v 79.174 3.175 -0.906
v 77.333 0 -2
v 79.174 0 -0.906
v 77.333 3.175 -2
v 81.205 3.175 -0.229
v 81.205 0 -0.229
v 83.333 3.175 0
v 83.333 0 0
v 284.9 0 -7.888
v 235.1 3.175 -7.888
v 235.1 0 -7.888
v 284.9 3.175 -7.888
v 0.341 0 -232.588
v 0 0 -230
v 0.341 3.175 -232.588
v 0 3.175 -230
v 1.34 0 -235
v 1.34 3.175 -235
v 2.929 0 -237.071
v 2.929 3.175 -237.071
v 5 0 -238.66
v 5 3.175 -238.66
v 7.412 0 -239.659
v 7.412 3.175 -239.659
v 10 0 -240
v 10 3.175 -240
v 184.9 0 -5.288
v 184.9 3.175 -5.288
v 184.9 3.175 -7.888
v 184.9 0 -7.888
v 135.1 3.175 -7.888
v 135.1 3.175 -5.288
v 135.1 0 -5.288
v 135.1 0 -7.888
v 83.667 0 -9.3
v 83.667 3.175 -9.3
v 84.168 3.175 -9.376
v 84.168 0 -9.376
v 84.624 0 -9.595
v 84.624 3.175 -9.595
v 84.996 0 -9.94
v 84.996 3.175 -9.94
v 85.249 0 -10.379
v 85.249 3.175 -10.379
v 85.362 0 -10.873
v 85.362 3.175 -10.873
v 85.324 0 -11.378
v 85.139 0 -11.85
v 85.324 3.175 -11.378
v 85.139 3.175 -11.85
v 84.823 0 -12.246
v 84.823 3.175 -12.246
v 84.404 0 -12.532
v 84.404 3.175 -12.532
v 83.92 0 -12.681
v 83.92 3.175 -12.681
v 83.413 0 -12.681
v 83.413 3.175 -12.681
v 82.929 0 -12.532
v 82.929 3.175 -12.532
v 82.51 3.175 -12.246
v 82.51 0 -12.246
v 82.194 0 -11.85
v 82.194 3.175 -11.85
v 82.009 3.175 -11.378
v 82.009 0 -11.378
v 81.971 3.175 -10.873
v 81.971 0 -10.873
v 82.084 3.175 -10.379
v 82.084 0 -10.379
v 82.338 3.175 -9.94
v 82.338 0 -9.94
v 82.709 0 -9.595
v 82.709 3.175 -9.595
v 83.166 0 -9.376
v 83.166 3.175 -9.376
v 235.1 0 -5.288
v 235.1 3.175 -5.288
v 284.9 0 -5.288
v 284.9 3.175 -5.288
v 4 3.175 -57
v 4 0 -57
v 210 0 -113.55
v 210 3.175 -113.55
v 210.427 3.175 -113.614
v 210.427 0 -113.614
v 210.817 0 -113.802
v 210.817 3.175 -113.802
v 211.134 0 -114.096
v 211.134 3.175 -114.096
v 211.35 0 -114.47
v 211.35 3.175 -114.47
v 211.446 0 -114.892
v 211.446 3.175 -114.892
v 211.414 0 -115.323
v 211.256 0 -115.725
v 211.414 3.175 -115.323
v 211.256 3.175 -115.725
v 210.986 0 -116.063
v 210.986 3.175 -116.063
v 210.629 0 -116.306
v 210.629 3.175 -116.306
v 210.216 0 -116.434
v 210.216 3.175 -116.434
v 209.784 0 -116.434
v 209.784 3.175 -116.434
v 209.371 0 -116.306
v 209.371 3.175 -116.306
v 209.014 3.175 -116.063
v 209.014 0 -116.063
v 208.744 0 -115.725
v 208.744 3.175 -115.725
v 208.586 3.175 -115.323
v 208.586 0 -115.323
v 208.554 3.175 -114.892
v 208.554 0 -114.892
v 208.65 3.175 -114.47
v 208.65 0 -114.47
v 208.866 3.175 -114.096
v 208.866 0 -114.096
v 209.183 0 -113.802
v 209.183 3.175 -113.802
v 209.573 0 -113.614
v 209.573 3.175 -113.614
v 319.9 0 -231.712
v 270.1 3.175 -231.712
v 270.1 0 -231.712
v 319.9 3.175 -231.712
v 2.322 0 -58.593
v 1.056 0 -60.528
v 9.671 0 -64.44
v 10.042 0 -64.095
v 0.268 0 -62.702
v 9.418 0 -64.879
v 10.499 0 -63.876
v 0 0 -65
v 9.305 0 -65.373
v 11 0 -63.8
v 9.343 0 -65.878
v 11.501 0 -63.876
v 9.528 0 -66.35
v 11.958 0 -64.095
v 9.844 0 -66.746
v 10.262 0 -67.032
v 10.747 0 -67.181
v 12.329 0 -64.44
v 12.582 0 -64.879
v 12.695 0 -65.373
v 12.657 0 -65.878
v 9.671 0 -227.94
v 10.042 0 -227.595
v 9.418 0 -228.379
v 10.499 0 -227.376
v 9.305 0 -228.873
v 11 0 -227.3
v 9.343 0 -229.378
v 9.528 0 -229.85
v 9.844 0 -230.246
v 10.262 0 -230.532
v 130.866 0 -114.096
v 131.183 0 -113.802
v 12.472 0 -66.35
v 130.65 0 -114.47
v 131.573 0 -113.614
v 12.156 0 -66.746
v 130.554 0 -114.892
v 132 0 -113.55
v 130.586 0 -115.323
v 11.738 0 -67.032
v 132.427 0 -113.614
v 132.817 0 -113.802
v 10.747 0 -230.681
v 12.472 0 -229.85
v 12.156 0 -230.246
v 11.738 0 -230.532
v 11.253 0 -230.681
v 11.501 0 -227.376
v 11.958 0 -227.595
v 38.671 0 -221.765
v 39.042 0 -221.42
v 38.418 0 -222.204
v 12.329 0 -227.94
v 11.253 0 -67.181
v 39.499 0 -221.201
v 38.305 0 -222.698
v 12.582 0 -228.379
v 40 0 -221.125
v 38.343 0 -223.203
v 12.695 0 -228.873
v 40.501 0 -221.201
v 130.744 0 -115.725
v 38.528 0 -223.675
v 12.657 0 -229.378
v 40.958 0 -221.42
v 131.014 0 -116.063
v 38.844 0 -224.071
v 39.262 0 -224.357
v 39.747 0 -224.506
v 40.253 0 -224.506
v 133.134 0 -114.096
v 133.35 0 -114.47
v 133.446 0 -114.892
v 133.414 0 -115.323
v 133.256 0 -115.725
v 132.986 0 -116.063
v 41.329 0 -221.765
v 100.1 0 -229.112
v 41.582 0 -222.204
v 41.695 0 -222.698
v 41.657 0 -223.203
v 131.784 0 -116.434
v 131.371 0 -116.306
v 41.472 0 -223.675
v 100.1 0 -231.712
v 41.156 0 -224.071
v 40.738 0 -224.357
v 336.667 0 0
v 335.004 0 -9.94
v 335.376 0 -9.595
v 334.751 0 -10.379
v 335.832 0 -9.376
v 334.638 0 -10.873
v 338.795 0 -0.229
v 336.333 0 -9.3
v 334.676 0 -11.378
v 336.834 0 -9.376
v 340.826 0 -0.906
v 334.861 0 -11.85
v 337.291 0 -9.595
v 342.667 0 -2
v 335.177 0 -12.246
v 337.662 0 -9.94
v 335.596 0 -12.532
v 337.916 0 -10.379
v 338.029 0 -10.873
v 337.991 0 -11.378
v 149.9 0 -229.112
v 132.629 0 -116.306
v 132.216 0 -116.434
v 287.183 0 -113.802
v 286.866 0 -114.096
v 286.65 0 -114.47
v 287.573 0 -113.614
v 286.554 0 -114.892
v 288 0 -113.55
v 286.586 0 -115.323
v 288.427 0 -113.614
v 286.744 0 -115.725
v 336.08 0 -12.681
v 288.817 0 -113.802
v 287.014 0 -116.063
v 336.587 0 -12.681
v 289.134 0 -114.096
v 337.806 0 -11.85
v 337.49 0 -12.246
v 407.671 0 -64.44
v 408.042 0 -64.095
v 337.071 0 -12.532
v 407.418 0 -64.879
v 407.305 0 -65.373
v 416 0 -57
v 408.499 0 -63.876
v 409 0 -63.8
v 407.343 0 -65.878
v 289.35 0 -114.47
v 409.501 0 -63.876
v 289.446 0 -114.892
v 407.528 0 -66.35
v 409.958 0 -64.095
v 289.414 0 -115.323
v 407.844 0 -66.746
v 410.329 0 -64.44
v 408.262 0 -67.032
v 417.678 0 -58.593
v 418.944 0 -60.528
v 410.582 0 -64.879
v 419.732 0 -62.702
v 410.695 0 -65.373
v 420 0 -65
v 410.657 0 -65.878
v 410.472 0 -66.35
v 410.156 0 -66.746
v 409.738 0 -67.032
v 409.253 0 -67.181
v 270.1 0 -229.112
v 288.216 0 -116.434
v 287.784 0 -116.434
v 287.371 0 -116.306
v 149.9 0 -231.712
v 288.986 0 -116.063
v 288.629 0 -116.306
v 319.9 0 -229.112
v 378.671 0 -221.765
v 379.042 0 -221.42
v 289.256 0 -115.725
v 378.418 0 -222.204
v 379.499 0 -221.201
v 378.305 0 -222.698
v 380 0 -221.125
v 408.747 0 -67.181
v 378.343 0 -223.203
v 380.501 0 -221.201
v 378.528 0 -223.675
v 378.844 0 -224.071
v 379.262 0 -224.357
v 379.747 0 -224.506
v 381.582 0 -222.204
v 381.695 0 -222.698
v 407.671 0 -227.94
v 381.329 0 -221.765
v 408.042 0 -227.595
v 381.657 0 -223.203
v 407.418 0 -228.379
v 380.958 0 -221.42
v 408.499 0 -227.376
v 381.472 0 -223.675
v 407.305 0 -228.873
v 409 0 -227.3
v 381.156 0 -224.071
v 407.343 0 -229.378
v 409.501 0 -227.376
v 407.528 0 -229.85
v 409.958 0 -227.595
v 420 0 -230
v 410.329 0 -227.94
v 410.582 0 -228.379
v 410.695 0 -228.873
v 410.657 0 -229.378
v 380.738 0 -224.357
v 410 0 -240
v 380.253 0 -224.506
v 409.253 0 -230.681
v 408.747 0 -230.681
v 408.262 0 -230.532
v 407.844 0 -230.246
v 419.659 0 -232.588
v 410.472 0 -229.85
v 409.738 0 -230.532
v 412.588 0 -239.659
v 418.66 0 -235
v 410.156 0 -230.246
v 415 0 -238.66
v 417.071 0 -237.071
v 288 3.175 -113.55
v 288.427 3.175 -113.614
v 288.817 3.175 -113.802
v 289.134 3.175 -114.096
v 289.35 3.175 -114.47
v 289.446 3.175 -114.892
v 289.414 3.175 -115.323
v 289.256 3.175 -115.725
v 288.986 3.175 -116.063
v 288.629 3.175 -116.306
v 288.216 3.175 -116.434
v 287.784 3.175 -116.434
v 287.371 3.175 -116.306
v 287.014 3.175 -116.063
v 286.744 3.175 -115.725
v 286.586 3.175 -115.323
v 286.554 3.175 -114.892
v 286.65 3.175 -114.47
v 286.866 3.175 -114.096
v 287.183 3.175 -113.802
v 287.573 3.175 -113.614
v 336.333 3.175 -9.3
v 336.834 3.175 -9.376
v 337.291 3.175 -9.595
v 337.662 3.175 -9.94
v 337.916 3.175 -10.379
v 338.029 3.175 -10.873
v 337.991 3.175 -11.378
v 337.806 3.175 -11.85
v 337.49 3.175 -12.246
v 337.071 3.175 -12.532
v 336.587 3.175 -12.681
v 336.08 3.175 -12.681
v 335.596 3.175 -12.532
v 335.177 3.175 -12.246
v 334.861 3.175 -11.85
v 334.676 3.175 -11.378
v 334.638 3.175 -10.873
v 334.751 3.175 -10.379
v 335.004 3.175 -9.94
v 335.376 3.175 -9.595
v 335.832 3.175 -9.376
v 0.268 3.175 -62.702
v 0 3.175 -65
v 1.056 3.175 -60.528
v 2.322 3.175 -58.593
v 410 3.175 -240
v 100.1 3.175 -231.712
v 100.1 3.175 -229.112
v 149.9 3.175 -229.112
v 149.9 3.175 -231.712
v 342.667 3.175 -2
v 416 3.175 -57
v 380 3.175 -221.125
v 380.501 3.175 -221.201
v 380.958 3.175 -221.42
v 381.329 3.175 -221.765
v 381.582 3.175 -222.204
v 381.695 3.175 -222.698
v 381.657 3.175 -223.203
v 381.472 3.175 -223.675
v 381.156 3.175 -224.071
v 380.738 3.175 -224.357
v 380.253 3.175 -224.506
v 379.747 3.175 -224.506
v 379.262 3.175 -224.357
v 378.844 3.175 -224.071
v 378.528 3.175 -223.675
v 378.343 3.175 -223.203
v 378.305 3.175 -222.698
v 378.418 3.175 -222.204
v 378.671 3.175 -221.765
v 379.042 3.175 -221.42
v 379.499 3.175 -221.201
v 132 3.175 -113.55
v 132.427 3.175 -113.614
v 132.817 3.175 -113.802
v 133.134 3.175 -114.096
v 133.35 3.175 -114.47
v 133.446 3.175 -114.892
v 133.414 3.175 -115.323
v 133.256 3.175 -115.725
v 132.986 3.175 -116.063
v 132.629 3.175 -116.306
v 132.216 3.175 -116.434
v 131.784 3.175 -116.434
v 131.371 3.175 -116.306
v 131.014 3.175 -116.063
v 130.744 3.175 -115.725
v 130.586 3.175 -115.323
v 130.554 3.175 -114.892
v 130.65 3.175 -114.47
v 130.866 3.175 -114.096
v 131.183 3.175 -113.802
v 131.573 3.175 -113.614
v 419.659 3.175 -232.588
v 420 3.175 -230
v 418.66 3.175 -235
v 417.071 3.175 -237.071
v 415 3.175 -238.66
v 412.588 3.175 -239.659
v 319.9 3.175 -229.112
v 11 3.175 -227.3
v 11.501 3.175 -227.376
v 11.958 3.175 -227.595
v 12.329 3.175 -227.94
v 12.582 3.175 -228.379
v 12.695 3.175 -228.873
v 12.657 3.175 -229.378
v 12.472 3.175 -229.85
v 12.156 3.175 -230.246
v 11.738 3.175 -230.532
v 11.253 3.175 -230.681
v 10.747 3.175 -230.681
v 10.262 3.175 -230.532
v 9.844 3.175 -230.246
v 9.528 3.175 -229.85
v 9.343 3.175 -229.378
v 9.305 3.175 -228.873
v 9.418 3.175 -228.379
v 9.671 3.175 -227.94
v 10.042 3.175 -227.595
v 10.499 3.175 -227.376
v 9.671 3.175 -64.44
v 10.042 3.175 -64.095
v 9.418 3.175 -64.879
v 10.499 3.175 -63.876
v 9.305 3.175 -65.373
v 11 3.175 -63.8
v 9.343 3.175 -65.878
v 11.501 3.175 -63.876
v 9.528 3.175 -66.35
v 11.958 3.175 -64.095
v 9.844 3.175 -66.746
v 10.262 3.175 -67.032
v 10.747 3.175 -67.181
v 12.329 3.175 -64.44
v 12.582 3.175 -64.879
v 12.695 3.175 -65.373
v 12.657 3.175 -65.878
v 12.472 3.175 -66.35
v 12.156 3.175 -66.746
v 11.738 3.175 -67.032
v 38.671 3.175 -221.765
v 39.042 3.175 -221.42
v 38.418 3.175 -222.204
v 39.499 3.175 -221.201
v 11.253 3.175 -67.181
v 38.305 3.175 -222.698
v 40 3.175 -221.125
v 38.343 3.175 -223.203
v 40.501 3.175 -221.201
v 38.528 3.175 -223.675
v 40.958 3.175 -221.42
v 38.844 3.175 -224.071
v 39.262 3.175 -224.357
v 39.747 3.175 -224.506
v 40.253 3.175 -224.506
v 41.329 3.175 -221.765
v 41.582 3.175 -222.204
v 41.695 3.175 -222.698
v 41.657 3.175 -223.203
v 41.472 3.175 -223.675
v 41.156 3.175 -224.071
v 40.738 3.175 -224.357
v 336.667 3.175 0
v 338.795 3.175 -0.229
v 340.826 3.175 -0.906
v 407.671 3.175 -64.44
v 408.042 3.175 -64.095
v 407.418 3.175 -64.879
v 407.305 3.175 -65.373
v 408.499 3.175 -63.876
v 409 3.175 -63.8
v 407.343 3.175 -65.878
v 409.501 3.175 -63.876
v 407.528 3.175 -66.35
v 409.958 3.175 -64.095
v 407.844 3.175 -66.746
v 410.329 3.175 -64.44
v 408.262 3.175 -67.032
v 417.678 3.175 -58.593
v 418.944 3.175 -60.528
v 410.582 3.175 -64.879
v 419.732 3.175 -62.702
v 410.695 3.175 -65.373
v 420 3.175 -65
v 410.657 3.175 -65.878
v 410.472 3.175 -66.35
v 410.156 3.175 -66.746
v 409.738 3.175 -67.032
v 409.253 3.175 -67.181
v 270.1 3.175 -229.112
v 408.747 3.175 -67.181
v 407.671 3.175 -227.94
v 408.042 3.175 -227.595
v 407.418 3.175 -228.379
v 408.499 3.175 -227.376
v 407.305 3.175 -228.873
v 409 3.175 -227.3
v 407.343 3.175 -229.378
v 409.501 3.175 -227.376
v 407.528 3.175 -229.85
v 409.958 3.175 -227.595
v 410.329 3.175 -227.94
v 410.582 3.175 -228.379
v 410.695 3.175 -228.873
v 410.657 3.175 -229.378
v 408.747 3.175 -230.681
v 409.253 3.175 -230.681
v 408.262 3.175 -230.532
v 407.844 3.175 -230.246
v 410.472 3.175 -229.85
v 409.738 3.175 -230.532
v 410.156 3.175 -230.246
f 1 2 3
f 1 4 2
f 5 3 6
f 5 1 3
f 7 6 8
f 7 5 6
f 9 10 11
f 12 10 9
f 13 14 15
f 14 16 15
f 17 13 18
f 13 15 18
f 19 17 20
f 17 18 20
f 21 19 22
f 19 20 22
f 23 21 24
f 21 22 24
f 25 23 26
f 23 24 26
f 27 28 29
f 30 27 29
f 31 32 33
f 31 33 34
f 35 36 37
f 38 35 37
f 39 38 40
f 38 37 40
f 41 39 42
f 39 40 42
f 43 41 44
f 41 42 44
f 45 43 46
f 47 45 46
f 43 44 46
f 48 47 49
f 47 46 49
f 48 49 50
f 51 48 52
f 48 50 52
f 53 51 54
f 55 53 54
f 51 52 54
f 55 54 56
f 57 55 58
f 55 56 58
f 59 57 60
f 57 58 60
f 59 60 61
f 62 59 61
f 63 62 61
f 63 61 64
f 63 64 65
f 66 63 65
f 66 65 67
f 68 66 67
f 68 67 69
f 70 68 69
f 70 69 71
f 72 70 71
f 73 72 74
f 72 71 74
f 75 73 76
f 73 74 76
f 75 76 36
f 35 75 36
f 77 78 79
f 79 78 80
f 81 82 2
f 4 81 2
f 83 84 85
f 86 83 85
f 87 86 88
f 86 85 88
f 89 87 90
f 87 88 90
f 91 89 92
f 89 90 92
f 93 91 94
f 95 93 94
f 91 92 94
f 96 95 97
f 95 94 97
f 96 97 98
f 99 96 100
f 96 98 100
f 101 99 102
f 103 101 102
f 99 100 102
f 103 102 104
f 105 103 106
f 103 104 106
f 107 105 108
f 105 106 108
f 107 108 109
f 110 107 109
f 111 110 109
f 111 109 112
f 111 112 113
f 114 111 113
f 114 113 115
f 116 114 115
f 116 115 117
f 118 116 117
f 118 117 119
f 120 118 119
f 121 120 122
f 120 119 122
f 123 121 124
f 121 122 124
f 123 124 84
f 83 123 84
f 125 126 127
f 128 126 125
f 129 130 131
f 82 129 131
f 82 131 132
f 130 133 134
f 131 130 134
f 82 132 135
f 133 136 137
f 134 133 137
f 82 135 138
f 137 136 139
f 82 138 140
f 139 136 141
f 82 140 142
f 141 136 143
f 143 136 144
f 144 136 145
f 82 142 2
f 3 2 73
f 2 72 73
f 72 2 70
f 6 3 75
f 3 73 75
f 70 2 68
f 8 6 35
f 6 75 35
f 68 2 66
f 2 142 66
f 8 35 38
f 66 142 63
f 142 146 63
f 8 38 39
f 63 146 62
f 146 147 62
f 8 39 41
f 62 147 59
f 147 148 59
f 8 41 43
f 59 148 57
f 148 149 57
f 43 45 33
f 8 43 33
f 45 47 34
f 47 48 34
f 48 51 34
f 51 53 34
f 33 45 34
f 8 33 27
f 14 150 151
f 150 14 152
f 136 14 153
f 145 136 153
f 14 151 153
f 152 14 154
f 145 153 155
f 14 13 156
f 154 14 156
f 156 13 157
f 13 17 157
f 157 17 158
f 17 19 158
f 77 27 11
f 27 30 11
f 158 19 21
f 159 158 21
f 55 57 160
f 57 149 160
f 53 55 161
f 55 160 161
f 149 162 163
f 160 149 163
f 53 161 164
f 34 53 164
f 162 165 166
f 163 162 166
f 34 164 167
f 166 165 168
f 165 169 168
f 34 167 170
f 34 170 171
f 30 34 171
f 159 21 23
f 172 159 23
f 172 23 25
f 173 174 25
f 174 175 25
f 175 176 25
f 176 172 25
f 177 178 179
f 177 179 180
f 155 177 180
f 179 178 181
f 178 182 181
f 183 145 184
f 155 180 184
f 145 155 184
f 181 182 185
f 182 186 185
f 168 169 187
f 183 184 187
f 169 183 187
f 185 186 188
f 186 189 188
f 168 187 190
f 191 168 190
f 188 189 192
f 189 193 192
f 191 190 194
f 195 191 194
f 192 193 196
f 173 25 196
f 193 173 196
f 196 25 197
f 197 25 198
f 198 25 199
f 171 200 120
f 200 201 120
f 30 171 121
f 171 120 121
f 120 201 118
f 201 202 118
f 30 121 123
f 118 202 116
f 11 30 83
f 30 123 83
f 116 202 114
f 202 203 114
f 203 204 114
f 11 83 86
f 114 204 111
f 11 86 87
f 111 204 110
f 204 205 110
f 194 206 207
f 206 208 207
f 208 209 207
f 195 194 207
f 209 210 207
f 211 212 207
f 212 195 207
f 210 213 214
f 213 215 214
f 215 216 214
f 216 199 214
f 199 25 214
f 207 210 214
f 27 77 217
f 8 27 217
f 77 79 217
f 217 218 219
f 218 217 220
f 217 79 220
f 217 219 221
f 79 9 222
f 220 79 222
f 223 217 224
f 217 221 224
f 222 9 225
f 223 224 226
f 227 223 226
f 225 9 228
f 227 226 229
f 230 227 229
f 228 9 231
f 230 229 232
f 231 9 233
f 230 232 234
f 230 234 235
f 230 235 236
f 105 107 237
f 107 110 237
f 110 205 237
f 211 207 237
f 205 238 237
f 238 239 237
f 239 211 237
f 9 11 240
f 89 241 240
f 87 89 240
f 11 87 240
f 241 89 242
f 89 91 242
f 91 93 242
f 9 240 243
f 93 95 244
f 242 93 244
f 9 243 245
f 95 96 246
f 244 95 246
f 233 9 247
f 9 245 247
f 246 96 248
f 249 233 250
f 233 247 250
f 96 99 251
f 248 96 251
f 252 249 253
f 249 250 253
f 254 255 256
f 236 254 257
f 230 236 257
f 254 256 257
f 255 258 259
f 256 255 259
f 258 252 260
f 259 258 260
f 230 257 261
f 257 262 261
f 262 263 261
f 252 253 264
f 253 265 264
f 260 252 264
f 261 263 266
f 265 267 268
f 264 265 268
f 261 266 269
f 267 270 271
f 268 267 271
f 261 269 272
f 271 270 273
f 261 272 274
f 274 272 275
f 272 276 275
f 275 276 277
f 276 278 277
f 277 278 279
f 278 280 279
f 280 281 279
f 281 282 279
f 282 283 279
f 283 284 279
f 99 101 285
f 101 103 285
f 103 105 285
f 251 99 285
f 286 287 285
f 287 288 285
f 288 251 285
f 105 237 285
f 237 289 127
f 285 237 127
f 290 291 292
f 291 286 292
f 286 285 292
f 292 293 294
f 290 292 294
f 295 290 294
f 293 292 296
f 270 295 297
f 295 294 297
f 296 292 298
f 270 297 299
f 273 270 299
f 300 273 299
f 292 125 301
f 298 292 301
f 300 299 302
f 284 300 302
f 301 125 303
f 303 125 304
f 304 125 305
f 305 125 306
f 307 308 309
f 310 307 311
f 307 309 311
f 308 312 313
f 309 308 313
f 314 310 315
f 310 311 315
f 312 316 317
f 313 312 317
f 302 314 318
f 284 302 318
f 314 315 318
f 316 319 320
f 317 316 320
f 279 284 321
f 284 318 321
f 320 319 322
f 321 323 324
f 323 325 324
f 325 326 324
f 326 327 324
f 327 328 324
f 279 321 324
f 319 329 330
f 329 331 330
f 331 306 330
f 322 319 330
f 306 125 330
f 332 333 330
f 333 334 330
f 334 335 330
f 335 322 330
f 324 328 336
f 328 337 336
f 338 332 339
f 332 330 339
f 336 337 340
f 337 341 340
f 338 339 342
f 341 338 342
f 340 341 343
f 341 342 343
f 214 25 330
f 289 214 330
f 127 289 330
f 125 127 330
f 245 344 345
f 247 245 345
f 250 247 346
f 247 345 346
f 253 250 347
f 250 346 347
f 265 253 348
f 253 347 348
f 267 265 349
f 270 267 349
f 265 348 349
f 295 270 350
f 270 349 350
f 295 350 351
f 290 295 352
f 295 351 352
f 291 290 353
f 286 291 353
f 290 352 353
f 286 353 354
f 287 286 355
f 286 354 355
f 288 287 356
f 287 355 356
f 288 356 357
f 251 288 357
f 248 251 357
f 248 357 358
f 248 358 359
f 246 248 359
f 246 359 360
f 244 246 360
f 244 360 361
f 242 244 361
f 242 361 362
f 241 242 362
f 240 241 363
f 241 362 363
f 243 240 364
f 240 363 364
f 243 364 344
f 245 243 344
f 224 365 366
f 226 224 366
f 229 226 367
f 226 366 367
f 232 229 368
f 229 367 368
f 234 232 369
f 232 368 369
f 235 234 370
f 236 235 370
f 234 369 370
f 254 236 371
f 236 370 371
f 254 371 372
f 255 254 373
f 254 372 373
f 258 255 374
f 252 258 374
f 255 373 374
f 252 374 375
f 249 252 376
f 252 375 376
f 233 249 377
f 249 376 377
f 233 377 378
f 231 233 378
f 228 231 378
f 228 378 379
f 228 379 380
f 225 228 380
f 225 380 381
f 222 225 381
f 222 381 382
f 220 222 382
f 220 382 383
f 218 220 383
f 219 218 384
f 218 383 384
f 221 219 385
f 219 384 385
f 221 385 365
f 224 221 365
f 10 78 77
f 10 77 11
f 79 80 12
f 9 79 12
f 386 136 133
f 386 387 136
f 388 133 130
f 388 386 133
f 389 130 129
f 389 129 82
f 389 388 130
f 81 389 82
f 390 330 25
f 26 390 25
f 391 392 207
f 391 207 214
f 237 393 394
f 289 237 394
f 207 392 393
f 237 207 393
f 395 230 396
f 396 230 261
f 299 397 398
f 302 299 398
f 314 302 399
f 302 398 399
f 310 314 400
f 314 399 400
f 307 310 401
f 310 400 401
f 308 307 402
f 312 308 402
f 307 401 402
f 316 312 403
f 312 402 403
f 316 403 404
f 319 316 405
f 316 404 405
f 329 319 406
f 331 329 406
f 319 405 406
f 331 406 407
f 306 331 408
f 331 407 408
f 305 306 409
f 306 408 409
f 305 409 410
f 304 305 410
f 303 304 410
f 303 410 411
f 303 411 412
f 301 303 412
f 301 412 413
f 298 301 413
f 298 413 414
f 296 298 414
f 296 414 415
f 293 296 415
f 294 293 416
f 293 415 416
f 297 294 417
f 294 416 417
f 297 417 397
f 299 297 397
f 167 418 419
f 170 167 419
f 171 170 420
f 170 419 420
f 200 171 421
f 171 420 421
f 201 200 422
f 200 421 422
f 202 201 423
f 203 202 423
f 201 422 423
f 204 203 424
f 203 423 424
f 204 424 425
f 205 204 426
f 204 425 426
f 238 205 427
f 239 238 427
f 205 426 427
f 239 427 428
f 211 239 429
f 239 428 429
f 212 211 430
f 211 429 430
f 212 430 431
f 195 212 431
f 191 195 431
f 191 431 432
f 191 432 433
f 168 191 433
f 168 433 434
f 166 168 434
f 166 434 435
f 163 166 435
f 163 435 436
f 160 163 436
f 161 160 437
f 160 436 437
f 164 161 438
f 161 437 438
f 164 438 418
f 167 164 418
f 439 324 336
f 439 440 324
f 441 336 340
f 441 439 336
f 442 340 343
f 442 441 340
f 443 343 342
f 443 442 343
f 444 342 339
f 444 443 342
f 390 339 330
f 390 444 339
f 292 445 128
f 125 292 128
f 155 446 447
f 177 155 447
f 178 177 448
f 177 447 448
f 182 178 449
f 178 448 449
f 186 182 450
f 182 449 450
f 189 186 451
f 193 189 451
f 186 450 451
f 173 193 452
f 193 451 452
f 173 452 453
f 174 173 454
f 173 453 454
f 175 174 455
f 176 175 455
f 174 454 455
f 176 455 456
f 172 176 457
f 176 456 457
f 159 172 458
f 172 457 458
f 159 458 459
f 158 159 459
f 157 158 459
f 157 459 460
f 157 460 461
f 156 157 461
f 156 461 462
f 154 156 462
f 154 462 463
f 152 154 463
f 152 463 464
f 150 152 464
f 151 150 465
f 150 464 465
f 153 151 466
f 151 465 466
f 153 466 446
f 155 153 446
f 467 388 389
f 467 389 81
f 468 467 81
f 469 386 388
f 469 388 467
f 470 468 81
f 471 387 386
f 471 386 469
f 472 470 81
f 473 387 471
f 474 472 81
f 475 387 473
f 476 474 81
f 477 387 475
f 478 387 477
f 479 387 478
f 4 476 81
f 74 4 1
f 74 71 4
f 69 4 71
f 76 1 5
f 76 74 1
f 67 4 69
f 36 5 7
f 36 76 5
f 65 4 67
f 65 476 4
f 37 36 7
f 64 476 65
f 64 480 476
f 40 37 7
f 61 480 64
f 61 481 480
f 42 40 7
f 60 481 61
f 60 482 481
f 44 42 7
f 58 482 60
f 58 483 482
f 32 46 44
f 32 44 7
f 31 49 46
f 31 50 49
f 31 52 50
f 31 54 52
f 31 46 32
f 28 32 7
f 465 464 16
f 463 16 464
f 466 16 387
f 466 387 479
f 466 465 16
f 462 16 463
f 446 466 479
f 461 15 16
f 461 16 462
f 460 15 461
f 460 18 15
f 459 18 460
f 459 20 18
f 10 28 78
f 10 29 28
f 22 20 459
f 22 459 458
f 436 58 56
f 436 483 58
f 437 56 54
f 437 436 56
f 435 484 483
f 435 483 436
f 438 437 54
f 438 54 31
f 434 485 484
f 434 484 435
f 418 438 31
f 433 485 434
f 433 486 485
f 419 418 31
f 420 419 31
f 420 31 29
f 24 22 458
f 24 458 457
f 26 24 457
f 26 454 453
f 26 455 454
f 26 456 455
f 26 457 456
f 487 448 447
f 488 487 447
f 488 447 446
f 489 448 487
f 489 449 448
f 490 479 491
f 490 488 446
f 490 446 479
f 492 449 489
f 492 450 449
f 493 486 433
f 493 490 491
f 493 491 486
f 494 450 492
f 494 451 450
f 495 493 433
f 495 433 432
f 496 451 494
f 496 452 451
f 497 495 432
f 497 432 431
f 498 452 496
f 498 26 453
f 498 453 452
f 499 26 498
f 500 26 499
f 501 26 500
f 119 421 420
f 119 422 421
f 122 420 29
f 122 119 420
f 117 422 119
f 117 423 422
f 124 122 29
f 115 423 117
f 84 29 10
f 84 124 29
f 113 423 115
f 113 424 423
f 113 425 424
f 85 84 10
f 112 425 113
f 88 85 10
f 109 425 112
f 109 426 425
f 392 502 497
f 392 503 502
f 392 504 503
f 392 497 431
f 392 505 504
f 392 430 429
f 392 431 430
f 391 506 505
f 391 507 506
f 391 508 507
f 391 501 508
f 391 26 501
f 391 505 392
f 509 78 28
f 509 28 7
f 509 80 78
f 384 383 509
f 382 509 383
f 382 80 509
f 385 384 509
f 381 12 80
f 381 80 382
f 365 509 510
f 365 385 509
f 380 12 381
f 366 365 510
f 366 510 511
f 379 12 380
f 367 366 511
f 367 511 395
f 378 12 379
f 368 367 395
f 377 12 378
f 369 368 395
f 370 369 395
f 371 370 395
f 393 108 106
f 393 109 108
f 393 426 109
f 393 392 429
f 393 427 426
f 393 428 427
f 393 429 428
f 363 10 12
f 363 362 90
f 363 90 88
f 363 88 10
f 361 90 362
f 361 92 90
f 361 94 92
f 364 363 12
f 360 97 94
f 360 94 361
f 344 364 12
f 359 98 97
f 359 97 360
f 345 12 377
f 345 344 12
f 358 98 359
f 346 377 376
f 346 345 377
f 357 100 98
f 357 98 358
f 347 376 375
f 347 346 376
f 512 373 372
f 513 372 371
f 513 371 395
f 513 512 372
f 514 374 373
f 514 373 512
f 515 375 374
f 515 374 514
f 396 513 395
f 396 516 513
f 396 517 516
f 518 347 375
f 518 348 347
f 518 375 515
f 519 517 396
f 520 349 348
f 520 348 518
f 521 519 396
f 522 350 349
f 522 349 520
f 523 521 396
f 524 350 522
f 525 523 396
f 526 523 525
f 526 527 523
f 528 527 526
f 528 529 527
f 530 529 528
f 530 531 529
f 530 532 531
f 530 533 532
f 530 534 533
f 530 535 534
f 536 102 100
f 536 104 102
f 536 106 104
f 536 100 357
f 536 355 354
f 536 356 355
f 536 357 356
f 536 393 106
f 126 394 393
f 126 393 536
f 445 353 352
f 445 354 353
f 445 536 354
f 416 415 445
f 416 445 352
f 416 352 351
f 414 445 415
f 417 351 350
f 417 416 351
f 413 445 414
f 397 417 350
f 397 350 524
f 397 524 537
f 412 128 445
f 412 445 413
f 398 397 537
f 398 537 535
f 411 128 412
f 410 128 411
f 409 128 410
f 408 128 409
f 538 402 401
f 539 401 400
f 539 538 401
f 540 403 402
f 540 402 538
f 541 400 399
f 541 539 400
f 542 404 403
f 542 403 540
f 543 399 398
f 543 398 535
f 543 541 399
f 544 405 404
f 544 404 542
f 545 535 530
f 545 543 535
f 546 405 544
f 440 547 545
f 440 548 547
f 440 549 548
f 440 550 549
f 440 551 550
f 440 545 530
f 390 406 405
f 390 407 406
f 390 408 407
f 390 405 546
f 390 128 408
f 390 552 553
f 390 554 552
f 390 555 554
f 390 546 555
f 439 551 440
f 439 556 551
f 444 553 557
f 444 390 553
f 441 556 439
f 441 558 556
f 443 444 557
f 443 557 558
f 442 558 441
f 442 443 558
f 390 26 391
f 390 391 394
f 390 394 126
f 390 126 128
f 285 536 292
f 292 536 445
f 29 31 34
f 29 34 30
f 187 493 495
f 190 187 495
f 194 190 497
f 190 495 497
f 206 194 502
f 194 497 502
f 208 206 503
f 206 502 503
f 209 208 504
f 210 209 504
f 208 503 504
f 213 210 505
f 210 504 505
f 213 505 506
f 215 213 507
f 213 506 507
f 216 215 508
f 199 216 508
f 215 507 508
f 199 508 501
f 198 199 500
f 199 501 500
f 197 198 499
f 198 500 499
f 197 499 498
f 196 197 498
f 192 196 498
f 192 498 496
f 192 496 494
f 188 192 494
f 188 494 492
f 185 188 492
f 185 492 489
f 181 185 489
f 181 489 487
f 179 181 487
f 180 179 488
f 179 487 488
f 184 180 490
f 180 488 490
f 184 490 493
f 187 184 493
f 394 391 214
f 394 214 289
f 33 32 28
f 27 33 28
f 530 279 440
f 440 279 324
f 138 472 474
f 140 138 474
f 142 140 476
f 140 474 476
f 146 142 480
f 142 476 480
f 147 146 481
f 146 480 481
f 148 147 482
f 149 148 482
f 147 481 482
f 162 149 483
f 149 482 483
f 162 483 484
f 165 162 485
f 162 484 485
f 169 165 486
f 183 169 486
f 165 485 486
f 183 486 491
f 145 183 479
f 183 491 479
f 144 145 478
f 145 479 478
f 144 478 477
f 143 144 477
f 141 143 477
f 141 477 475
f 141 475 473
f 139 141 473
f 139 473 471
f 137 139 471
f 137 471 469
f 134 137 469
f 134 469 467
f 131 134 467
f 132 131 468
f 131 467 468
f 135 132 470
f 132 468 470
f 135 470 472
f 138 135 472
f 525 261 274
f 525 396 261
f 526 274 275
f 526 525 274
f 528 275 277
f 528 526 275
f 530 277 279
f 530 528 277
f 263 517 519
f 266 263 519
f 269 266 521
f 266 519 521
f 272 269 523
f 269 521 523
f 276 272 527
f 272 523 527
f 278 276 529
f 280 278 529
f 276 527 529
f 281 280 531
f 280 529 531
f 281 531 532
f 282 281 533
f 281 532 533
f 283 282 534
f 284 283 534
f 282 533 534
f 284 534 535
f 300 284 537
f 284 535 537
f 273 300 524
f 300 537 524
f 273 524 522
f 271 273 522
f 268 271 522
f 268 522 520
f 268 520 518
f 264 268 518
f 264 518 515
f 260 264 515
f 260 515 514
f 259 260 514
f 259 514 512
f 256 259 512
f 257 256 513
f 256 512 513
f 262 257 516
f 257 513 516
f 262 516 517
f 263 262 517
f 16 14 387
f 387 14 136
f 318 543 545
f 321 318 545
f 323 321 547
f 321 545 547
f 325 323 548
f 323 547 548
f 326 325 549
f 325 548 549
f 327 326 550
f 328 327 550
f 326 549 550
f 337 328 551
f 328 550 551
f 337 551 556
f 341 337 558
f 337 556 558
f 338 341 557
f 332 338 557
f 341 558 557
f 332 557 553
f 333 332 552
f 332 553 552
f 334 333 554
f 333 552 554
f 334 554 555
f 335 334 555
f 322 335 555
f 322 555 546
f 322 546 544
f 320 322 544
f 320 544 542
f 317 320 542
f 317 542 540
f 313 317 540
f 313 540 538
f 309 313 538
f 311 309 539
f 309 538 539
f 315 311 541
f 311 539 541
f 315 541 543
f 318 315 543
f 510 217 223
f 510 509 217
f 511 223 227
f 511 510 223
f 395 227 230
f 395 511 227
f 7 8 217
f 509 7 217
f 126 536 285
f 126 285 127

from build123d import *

# Parameters (mm, degrees)
BOSS_EXTRUDE1_DEPTH = 3.175
FILLET1_R           = 10
SKETCH2_R           = 1.7
SKETCH2_R_2         = 1.45
CUT_EXTRUDE1_DEPTH  = 3.175
SKETCH6_W           = 49.8
SKETCH6_H           = 2.6
CUT_EXTRUDE2_DEPTH  = 3.175


with BuildPart() as part:
    # Sketch1 → Boss-Extrude1 (new body)
    with BuildSketch(Plane(origin=(0, 0, 0), x_dir=(1, 0, 0), z_dir=(0, 1, 0))):
        Polygon((0, 240), (0, 60), (80, 0), (340, 0), (420, 60), (420, 240), align=None)
    extrude(amount=BOSS_EXTRUDE1_DEPTH)

    # Fillet1
    fillet1_edges = [part.edges().sort_by_distance(p)[0] for p in [
        (420, 1.5875, -240),
        (420, 1.5875, -60),
        (340, 1.5875, 0),
        (80, 1.5875, 0),
        (0, 1.5875, -60),
        (0, 1.5875, -240),
    ]]
    fillet(fillet1_edges, radius=FILLET1_R)

    # Sketch2 → Cut-Extrude1 (cut)
    with BuildSketch(Plane(origin=(0, 3.175, 0), x_dir=(1, 0, 0), z_dir=(0, 1, 0))):
        with Locations(Location((11, 229, 0), (0, 0, 270))):
            Circle(SKETCH2_R)
        with Locations(Location((11, 65.5, 0), (0, 0, 270))):
            Circle(SKETCH2_R)
        with Locations(Location((83.666666667, 11, 0), (0, 0, 270))):
            Circle(SKETCH2_R)
        with Locations(Location((409, 65.5, 0), (0, 0, 270))):
            Circle(SKETCH2_R)
        with Locations(Location((336.333333333, 11, 0), (0, 0, 270))):
            Circle(SKETCH2_R)
        with Locations(Location((210, 115, 0), (0, 0, 270))):
            Circle(SKETCH2_R_2)
        with Locations(Location((132, 115, 0), (0, 0, 270))):
            Circle(SKETCH2_R_2)
        with Locations(Location((288, 115, 0), (0, 0, 270))):
            Circle(SKETCH2_R_2)
        with Locations(Location((40, 222.825, 0), (0, 0, 270))):
            Circle(SKETCH2_R)
        with Locations(Location((380, 222.825, 0), (0, 0, 270))):
            Circle(SKETCH2_R)
        with Locations(Location((409, 229, 0), (0, 0, 270))):
            Circle(SKETCH2_R)
    extrude(amount=-CUT_EXTRUDE1_DEPTH, mode=Mode.SUBTRACT)

    # Sketch6 → Cut-Extrude2 (cut)
    with BuildSketch(Plane(origin=(0, 3.175, 0), x_dir=(1, 0, 0), z_dir=(0, 1, 0))):
        with Locations((160, 6.5875)):
            Rectangle(SKETCH6_W, SKETCH6_H)
        with Locations((125, 230.4125)):
            Rectangle(SKETCH6_W, SKETCH6_H)
        with Locations((295, 230.4125)):
            Rectangle(SKETCH6_W, SKETCH6_H)
        with Locations((260, 6.5875)):
            Rectangle(SKETCH6_W, SKETCH6_H)
    extrude(amount=-CUT_EXTRUDE2_DEPTH, mode=Mode.SUBTRACT)


solid = part.part
